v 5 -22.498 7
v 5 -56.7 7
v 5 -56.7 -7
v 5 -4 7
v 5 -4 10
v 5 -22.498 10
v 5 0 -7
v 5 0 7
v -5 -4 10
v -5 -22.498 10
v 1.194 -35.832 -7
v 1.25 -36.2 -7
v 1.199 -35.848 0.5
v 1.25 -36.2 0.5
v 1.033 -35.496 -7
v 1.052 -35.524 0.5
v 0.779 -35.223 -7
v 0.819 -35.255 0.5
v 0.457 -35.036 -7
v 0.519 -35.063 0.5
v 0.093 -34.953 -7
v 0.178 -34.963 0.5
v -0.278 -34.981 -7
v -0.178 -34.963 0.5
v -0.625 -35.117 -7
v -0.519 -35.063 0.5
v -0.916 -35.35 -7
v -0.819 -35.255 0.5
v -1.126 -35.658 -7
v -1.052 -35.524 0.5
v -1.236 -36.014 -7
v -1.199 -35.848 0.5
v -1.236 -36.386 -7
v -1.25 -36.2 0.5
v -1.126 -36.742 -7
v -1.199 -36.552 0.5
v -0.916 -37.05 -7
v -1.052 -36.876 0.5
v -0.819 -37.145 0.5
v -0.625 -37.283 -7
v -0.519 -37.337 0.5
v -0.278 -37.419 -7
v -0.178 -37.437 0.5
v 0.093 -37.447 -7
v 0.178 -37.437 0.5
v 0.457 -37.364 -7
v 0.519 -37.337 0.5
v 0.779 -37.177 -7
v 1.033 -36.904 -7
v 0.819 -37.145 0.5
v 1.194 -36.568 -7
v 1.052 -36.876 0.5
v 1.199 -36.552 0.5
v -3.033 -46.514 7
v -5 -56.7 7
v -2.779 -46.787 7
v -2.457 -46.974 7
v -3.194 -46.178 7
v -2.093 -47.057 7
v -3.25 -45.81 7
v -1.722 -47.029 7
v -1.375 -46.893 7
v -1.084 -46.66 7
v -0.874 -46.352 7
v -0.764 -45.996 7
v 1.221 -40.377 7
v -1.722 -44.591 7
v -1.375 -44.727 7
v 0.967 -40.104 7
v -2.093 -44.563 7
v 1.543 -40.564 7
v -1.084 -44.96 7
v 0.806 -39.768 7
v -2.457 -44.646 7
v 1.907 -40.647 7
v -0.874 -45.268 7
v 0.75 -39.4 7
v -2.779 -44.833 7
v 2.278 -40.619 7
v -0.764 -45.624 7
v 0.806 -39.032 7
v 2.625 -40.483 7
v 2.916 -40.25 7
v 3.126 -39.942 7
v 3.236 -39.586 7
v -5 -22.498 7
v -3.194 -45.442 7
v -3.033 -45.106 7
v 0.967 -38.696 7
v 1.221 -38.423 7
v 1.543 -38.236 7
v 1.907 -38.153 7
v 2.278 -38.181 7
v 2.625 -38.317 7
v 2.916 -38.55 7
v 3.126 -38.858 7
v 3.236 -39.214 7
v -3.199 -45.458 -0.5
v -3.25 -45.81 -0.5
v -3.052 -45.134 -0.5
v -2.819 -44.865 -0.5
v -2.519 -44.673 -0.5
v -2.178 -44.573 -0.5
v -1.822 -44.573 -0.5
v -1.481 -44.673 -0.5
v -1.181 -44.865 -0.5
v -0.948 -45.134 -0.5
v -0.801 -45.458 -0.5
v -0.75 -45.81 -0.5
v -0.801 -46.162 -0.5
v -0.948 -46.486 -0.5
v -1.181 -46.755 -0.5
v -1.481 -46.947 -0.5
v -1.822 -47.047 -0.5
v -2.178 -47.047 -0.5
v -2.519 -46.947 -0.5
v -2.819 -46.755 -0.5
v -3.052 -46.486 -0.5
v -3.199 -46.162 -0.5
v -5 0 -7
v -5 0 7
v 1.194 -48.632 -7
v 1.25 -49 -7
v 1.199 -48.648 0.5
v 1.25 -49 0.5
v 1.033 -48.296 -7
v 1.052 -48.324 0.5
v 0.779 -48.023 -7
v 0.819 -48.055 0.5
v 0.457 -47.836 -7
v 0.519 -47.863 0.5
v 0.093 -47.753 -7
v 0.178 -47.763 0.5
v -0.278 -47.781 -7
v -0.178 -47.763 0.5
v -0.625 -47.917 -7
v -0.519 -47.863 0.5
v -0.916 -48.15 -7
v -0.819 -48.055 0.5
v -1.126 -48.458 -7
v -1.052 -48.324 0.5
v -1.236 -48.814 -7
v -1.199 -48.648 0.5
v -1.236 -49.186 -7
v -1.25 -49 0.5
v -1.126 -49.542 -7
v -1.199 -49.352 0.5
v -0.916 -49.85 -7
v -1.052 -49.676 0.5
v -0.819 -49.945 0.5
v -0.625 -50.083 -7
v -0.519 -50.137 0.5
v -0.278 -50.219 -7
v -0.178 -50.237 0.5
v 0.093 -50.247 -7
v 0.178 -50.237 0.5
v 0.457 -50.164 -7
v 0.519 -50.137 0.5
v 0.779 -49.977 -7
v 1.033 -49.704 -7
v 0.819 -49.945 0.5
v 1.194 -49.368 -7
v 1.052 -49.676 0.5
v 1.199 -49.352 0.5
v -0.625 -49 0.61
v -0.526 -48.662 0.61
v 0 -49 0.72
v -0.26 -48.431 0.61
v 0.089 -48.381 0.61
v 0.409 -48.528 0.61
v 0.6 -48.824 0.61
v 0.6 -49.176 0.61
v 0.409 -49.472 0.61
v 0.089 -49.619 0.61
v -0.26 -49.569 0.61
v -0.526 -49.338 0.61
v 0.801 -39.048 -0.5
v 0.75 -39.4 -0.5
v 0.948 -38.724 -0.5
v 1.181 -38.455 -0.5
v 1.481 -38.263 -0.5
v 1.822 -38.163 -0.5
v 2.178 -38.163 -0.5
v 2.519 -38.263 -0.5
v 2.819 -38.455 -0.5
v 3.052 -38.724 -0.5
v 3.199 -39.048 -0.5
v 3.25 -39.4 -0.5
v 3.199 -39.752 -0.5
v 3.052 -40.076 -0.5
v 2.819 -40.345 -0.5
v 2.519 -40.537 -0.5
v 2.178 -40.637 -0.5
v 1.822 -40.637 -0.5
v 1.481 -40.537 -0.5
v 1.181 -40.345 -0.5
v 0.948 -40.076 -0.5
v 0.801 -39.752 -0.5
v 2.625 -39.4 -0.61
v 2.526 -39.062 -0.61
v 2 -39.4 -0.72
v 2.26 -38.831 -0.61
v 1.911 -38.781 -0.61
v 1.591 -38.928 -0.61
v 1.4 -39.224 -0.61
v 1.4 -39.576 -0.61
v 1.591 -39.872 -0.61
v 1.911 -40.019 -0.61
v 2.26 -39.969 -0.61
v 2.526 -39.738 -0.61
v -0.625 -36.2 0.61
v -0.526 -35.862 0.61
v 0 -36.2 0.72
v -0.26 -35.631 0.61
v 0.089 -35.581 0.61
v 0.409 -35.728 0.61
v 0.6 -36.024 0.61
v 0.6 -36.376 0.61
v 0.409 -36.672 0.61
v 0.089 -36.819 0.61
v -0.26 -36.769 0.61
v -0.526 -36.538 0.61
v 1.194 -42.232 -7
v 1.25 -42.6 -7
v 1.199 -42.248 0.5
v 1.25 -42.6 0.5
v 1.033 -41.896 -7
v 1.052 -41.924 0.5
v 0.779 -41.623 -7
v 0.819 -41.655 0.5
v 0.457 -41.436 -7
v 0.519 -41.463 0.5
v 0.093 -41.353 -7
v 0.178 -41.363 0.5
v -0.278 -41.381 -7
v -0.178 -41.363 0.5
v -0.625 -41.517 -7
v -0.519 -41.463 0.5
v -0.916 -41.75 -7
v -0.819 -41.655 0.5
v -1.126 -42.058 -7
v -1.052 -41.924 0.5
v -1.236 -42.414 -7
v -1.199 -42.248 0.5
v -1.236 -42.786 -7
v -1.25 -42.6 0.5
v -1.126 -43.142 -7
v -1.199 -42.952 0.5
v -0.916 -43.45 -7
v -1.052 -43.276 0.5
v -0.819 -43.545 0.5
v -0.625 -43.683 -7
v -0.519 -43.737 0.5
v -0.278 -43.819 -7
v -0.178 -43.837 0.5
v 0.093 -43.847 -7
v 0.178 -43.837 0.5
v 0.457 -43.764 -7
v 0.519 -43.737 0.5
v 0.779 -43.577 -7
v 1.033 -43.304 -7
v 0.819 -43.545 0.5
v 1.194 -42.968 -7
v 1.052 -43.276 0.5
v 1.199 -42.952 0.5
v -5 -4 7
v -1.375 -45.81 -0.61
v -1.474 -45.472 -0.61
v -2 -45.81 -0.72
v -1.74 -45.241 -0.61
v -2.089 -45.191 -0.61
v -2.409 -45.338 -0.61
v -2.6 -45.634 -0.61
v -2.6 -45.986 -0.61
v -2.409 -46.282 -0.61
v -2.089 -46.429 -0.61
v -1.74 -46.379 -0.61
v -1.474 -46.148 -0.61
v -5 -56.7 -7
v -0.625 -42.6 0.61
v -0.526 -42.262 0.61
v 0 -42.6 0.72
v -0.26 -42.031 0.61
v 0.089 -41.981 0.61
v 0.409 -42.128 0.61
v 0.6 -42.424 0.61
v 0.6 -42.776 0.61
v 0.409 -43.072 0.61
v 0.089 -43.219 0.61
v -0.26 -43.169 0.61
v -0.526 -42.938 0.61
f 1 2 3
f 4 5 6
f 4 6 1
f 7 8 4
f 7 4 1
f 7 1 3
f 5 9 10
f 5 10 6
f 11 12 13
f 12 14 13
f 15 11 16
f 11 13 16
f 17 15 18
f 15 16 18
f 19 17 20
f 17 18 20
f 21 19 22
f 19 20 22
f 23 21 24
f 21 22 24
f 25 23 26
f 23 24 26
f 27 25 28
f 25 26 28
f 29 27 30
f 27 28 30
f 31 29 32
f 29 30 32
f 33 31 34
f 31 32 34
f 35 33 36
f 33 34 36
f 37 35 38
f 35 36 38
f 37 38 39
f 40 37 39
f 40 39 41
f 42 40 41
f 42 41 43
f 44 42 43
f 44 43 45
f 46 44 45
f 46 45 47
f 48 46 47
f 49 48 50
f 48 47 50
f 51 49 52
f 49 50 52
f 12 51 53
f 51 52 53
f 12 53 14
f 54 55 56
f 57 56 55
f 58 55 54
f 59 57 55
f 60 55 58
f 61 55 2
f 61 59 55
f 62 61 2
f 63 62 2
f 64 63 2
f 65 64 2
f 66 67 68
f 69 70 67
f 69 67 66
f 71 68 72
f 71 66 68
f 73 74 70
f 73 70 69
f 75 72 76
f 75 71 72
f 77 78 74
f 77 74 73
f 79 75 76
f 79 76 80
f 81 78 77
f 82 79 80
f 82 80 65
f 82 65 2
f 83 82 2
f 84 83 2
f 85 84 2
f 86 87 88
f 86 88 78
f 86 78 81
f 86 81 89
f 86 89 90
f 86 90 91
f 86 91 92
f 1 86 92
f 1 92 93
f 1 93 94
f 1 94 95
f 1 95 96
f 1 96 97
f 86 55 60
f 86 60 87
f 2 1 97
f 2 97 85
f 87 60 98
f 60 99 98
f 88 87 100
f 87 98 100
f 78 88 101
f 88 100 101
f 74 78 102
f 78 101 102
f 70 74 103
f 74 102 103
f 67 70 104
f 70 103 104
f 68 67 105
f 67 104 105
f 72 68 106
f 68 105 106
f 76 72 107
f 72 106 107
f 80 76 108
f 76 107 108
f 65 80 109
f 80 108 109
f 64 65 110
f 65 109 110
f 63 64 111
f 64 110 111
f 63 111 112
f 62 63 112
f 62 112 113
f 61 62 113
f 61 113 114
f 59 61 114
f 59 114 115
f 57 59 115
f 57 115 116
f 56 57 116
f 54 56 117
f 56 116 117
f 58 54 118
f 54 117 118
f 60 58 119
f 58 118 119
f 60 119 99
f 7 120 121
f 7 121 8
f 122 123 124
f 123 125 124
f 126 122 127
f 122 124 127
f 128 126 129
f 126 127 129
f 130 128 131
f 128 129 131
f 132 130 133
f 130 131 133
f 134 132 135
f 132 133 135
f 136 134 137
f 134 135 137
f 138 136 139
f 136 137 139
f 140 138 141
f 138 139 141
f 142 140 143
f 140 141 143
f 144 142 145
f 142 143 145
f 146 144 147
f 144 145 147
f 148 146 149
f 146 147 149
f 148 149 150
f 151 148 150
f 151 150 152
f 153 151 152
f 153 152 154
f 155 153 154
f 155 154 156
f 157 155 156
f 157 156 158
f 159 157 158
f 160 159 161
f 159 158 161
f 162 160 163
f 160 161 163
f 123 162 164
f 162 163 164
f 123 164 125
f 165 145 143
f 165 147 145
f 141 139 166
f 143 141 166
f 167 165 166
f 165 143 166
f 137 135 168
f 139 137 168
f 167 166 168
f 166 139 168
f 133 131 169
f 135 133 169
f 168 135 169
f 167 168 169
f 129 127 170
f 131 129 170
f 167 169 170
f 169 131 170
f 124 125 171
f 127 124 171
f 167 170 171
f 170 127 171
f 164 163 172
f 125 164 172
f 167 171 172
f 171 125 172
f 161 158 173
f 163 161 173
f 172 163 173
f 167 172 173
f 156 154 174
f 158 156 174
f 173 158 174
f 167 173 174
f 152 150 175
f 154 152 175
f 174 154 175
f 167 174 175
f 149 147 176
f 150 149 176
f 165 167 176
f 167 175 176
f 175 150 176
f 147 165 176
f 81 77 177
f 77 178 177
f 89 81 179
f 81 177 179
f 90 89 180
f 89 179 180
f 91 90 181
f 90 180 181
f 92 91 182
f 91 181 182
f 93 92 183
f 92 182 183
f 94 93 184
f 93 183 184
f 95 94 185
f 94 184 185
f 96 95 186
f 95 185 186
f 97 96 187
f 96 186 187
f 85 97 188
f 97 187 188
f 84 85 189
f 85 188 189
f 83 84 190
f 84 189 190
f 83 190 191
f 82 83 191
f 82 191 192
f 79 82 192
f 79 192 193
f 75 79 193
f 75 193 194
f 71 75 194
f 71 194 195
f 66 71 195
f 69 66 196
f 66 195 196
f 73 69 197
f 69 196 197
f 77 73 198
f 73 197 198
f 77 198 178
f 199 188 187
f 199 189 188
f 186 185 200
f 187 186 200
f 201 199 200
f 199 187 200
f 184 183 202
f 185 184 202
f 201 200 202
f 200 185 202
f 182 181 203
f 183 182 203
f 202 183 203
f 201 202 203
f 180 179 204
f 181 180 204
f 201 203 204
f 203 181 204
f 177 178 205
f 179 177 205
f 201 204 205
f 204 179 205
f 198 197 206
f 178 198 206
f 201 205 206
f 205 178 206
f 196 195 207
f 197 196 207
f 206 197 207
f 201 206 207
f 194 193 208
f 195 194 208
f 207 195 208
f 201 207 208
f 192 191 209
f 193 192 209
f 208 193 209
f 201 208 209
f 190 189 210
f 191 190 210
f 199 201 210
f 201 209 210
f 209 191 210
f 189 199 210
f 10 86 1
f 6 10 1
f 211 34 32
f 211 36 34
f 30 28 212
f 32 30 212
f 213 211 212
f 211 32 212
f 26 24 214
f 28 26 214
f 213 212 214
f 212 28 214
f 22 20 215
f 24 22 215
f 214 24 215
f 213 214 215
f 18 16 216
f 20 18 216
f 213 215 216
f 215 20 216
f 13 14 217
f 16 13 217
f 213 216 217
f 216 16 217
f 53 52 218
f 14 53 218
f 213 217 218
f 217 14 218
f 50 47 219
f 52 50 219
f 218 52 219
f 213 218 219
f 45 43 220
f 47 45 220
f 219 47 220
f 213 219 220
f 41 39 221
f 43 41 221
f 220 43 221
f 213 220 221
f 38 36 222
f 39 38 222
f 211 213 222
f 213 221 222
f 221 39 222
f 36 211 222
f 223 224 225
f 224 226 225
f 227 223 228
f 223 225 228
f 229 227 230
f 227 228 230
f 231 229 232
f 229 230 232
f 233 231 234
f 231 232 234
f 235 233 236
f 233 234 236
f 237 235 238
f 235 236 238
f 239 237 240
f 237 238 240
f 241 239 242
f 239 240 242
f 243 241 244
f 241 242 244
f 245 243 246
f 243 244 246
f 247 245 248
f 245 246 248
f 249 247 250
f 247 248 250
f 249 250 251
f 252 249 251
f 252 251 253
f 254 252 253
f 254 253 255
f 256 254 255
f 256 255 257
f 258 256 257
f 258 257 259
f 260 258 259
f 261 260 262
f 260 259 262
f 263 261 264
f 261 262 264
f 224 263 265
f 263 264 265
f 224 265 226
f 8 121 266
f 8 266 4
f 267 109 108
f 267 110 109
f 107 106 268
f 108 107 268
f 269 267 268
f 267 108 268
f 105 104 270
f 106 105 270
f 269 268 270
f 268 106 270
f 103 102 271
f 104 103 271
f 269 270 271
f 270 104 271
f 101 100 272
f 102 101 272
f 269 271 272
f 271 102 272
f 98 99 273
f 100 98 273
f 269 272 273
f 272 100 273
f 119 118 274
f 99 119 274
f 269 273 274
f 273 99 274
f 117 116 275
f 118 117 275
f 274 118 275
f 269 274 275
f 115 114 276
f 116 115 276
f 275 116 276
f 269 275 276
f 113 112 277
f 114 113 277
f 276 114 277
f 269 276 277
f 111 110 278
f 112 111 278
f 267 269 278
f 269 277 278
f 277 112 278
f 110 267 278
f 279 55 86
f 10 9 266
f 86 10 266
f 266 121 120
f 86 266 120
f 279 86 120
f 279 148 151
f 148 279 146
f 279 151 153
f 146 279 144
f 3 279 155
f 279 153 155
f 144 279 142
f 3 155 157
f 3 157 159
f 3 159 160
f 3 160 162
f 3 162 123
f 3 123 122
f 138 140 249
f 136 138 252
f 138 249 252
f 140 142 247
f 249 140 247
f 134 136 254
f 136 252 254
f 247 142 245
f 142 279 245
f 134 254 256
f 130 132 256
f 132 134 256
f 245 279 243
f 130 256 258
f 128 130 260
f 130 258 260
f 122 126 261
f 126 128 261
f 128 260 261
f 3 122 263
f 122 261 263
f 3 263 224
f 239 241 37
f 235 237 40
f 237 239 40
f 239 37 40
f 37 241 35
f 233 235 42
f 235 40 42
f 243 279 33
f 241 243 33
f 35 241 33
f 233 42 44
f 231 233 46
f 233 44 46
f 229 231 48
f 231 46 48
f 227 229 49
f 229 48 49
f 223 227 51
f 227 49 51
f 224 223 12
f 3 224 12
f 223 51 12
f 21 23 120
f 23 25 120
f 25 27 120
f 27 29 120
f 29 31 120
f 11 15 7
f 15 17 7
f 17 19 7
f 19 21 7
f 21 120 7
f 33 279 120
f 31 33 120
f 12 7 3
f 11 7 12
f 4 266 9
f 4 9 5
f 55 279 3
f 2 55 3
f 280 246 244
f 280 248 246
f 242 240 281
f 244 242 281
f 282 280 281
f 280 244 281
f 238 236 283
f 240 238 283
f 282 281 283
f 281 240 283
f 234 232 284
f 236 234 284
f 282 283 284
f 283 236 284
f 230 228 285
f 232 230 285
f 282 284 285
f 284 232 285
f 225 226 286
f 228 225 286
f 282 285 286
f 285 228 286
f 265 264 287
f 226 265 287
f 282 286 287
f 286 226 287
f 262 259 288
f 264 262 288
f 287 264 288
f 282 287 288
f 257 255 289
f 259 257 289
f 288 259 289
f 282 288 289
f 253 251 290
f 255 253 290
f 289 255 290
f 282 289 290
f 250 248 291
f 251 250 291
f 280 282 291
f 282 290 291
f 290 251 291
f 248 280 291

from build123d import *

# Parameters (mm, degrees)
SKETCH1_W                 = 10
SKETCH1_H                 = 14
EXTRUDE1_DEPTH            = 56.7
SKETCH2_W                 = 10
SKETCH2_H                 = 18.498
EXTRUDE2_DEPTH            = 3
M3X0_5_TAPPED_HOLE1_D     = 2.5
M3X0_5_TAPPED_HOLE1_DEPTH = 7.5
M3X0_5_TAPPED_HOLE1_TIP   = 0.220408726
M3X0_5_TAPPED_HOLE2_D     = 2.5
M3X0_5_TAPPED_HOLE2_DEPTH = 7.5
M3X0_5_TAPPED_HOLE2_TIP   = 0.220408726


with BuildPart() as part:
    # Sketch1 → Extrude1 (new body)
    with BuildSketch(Plane(origin=(0, 0, 0), x_dir=(1, 0, 0), z_dir=(0, 1, 0))):
        Rectangle(SKETCH1_W, SKETCH1_H)
    extrude(amount=-EXTRUDE1_DEPTH)

    # Sketch2 → Extrude2 (add)
    with BuildSketch(Plane.XY.offset(7)):
        with Locations((0, -13.249)):
            Rectangle(SKETCH2_W, SKETCH2_H)
    extrude(amount=EXTRUDE2_DEPTH)

    # M3x0.5 Tapped Hole1
    with Locations(Plane(origin=(0, -36.2, -7), x_dir=(-1, 0, 0), z_dir=(0, 0, -1))):
        with Locations((0, 0), (0, -6.4), (0, -12.8)):
            Hole(M3X0_5_TAPPED_HOLE1_D / 2, depth=M3X0_5_TAPPED_HOLE1_DEPTH)
            with Locations((0, 0, -(M3X0_5_TAPPED_HOLE1_DEPTH + M3X0_5_TAPPED_HOLE1_TIP / 2))):  # 160° drill point
                Cone(0, M3X0_5_TAPPED_HOLE1_D / 2, M3X0_5_TAPPED_HOLE1_TIP, mode=Mode.SUBTRACT)

    # M3x0.5 Tapped Hole2
    with Locations(Plane.XY.offset(7)):
        with Locations((2, -39.4), (-2, -45.81)):
            Hole(M3X0_5_TAPPED_HOLE2_D / 2, depth=M3X0_5_TAPPED_HOLE2_DEPTH)
            with Locations((0, 0, -(M3X0_5_TAPPED_HOLE2_DEPTH + M3X0_5_TAPPED_HOLE2_TIP / 2))):  # 160° drill point
                Cone(0, M3X0_5_TAPPED_HOLE2_D / 2, M3X0_5_TAPPED_HOLE2_TIP, mode=Mode.SUBTRACT)


solid = part.part
